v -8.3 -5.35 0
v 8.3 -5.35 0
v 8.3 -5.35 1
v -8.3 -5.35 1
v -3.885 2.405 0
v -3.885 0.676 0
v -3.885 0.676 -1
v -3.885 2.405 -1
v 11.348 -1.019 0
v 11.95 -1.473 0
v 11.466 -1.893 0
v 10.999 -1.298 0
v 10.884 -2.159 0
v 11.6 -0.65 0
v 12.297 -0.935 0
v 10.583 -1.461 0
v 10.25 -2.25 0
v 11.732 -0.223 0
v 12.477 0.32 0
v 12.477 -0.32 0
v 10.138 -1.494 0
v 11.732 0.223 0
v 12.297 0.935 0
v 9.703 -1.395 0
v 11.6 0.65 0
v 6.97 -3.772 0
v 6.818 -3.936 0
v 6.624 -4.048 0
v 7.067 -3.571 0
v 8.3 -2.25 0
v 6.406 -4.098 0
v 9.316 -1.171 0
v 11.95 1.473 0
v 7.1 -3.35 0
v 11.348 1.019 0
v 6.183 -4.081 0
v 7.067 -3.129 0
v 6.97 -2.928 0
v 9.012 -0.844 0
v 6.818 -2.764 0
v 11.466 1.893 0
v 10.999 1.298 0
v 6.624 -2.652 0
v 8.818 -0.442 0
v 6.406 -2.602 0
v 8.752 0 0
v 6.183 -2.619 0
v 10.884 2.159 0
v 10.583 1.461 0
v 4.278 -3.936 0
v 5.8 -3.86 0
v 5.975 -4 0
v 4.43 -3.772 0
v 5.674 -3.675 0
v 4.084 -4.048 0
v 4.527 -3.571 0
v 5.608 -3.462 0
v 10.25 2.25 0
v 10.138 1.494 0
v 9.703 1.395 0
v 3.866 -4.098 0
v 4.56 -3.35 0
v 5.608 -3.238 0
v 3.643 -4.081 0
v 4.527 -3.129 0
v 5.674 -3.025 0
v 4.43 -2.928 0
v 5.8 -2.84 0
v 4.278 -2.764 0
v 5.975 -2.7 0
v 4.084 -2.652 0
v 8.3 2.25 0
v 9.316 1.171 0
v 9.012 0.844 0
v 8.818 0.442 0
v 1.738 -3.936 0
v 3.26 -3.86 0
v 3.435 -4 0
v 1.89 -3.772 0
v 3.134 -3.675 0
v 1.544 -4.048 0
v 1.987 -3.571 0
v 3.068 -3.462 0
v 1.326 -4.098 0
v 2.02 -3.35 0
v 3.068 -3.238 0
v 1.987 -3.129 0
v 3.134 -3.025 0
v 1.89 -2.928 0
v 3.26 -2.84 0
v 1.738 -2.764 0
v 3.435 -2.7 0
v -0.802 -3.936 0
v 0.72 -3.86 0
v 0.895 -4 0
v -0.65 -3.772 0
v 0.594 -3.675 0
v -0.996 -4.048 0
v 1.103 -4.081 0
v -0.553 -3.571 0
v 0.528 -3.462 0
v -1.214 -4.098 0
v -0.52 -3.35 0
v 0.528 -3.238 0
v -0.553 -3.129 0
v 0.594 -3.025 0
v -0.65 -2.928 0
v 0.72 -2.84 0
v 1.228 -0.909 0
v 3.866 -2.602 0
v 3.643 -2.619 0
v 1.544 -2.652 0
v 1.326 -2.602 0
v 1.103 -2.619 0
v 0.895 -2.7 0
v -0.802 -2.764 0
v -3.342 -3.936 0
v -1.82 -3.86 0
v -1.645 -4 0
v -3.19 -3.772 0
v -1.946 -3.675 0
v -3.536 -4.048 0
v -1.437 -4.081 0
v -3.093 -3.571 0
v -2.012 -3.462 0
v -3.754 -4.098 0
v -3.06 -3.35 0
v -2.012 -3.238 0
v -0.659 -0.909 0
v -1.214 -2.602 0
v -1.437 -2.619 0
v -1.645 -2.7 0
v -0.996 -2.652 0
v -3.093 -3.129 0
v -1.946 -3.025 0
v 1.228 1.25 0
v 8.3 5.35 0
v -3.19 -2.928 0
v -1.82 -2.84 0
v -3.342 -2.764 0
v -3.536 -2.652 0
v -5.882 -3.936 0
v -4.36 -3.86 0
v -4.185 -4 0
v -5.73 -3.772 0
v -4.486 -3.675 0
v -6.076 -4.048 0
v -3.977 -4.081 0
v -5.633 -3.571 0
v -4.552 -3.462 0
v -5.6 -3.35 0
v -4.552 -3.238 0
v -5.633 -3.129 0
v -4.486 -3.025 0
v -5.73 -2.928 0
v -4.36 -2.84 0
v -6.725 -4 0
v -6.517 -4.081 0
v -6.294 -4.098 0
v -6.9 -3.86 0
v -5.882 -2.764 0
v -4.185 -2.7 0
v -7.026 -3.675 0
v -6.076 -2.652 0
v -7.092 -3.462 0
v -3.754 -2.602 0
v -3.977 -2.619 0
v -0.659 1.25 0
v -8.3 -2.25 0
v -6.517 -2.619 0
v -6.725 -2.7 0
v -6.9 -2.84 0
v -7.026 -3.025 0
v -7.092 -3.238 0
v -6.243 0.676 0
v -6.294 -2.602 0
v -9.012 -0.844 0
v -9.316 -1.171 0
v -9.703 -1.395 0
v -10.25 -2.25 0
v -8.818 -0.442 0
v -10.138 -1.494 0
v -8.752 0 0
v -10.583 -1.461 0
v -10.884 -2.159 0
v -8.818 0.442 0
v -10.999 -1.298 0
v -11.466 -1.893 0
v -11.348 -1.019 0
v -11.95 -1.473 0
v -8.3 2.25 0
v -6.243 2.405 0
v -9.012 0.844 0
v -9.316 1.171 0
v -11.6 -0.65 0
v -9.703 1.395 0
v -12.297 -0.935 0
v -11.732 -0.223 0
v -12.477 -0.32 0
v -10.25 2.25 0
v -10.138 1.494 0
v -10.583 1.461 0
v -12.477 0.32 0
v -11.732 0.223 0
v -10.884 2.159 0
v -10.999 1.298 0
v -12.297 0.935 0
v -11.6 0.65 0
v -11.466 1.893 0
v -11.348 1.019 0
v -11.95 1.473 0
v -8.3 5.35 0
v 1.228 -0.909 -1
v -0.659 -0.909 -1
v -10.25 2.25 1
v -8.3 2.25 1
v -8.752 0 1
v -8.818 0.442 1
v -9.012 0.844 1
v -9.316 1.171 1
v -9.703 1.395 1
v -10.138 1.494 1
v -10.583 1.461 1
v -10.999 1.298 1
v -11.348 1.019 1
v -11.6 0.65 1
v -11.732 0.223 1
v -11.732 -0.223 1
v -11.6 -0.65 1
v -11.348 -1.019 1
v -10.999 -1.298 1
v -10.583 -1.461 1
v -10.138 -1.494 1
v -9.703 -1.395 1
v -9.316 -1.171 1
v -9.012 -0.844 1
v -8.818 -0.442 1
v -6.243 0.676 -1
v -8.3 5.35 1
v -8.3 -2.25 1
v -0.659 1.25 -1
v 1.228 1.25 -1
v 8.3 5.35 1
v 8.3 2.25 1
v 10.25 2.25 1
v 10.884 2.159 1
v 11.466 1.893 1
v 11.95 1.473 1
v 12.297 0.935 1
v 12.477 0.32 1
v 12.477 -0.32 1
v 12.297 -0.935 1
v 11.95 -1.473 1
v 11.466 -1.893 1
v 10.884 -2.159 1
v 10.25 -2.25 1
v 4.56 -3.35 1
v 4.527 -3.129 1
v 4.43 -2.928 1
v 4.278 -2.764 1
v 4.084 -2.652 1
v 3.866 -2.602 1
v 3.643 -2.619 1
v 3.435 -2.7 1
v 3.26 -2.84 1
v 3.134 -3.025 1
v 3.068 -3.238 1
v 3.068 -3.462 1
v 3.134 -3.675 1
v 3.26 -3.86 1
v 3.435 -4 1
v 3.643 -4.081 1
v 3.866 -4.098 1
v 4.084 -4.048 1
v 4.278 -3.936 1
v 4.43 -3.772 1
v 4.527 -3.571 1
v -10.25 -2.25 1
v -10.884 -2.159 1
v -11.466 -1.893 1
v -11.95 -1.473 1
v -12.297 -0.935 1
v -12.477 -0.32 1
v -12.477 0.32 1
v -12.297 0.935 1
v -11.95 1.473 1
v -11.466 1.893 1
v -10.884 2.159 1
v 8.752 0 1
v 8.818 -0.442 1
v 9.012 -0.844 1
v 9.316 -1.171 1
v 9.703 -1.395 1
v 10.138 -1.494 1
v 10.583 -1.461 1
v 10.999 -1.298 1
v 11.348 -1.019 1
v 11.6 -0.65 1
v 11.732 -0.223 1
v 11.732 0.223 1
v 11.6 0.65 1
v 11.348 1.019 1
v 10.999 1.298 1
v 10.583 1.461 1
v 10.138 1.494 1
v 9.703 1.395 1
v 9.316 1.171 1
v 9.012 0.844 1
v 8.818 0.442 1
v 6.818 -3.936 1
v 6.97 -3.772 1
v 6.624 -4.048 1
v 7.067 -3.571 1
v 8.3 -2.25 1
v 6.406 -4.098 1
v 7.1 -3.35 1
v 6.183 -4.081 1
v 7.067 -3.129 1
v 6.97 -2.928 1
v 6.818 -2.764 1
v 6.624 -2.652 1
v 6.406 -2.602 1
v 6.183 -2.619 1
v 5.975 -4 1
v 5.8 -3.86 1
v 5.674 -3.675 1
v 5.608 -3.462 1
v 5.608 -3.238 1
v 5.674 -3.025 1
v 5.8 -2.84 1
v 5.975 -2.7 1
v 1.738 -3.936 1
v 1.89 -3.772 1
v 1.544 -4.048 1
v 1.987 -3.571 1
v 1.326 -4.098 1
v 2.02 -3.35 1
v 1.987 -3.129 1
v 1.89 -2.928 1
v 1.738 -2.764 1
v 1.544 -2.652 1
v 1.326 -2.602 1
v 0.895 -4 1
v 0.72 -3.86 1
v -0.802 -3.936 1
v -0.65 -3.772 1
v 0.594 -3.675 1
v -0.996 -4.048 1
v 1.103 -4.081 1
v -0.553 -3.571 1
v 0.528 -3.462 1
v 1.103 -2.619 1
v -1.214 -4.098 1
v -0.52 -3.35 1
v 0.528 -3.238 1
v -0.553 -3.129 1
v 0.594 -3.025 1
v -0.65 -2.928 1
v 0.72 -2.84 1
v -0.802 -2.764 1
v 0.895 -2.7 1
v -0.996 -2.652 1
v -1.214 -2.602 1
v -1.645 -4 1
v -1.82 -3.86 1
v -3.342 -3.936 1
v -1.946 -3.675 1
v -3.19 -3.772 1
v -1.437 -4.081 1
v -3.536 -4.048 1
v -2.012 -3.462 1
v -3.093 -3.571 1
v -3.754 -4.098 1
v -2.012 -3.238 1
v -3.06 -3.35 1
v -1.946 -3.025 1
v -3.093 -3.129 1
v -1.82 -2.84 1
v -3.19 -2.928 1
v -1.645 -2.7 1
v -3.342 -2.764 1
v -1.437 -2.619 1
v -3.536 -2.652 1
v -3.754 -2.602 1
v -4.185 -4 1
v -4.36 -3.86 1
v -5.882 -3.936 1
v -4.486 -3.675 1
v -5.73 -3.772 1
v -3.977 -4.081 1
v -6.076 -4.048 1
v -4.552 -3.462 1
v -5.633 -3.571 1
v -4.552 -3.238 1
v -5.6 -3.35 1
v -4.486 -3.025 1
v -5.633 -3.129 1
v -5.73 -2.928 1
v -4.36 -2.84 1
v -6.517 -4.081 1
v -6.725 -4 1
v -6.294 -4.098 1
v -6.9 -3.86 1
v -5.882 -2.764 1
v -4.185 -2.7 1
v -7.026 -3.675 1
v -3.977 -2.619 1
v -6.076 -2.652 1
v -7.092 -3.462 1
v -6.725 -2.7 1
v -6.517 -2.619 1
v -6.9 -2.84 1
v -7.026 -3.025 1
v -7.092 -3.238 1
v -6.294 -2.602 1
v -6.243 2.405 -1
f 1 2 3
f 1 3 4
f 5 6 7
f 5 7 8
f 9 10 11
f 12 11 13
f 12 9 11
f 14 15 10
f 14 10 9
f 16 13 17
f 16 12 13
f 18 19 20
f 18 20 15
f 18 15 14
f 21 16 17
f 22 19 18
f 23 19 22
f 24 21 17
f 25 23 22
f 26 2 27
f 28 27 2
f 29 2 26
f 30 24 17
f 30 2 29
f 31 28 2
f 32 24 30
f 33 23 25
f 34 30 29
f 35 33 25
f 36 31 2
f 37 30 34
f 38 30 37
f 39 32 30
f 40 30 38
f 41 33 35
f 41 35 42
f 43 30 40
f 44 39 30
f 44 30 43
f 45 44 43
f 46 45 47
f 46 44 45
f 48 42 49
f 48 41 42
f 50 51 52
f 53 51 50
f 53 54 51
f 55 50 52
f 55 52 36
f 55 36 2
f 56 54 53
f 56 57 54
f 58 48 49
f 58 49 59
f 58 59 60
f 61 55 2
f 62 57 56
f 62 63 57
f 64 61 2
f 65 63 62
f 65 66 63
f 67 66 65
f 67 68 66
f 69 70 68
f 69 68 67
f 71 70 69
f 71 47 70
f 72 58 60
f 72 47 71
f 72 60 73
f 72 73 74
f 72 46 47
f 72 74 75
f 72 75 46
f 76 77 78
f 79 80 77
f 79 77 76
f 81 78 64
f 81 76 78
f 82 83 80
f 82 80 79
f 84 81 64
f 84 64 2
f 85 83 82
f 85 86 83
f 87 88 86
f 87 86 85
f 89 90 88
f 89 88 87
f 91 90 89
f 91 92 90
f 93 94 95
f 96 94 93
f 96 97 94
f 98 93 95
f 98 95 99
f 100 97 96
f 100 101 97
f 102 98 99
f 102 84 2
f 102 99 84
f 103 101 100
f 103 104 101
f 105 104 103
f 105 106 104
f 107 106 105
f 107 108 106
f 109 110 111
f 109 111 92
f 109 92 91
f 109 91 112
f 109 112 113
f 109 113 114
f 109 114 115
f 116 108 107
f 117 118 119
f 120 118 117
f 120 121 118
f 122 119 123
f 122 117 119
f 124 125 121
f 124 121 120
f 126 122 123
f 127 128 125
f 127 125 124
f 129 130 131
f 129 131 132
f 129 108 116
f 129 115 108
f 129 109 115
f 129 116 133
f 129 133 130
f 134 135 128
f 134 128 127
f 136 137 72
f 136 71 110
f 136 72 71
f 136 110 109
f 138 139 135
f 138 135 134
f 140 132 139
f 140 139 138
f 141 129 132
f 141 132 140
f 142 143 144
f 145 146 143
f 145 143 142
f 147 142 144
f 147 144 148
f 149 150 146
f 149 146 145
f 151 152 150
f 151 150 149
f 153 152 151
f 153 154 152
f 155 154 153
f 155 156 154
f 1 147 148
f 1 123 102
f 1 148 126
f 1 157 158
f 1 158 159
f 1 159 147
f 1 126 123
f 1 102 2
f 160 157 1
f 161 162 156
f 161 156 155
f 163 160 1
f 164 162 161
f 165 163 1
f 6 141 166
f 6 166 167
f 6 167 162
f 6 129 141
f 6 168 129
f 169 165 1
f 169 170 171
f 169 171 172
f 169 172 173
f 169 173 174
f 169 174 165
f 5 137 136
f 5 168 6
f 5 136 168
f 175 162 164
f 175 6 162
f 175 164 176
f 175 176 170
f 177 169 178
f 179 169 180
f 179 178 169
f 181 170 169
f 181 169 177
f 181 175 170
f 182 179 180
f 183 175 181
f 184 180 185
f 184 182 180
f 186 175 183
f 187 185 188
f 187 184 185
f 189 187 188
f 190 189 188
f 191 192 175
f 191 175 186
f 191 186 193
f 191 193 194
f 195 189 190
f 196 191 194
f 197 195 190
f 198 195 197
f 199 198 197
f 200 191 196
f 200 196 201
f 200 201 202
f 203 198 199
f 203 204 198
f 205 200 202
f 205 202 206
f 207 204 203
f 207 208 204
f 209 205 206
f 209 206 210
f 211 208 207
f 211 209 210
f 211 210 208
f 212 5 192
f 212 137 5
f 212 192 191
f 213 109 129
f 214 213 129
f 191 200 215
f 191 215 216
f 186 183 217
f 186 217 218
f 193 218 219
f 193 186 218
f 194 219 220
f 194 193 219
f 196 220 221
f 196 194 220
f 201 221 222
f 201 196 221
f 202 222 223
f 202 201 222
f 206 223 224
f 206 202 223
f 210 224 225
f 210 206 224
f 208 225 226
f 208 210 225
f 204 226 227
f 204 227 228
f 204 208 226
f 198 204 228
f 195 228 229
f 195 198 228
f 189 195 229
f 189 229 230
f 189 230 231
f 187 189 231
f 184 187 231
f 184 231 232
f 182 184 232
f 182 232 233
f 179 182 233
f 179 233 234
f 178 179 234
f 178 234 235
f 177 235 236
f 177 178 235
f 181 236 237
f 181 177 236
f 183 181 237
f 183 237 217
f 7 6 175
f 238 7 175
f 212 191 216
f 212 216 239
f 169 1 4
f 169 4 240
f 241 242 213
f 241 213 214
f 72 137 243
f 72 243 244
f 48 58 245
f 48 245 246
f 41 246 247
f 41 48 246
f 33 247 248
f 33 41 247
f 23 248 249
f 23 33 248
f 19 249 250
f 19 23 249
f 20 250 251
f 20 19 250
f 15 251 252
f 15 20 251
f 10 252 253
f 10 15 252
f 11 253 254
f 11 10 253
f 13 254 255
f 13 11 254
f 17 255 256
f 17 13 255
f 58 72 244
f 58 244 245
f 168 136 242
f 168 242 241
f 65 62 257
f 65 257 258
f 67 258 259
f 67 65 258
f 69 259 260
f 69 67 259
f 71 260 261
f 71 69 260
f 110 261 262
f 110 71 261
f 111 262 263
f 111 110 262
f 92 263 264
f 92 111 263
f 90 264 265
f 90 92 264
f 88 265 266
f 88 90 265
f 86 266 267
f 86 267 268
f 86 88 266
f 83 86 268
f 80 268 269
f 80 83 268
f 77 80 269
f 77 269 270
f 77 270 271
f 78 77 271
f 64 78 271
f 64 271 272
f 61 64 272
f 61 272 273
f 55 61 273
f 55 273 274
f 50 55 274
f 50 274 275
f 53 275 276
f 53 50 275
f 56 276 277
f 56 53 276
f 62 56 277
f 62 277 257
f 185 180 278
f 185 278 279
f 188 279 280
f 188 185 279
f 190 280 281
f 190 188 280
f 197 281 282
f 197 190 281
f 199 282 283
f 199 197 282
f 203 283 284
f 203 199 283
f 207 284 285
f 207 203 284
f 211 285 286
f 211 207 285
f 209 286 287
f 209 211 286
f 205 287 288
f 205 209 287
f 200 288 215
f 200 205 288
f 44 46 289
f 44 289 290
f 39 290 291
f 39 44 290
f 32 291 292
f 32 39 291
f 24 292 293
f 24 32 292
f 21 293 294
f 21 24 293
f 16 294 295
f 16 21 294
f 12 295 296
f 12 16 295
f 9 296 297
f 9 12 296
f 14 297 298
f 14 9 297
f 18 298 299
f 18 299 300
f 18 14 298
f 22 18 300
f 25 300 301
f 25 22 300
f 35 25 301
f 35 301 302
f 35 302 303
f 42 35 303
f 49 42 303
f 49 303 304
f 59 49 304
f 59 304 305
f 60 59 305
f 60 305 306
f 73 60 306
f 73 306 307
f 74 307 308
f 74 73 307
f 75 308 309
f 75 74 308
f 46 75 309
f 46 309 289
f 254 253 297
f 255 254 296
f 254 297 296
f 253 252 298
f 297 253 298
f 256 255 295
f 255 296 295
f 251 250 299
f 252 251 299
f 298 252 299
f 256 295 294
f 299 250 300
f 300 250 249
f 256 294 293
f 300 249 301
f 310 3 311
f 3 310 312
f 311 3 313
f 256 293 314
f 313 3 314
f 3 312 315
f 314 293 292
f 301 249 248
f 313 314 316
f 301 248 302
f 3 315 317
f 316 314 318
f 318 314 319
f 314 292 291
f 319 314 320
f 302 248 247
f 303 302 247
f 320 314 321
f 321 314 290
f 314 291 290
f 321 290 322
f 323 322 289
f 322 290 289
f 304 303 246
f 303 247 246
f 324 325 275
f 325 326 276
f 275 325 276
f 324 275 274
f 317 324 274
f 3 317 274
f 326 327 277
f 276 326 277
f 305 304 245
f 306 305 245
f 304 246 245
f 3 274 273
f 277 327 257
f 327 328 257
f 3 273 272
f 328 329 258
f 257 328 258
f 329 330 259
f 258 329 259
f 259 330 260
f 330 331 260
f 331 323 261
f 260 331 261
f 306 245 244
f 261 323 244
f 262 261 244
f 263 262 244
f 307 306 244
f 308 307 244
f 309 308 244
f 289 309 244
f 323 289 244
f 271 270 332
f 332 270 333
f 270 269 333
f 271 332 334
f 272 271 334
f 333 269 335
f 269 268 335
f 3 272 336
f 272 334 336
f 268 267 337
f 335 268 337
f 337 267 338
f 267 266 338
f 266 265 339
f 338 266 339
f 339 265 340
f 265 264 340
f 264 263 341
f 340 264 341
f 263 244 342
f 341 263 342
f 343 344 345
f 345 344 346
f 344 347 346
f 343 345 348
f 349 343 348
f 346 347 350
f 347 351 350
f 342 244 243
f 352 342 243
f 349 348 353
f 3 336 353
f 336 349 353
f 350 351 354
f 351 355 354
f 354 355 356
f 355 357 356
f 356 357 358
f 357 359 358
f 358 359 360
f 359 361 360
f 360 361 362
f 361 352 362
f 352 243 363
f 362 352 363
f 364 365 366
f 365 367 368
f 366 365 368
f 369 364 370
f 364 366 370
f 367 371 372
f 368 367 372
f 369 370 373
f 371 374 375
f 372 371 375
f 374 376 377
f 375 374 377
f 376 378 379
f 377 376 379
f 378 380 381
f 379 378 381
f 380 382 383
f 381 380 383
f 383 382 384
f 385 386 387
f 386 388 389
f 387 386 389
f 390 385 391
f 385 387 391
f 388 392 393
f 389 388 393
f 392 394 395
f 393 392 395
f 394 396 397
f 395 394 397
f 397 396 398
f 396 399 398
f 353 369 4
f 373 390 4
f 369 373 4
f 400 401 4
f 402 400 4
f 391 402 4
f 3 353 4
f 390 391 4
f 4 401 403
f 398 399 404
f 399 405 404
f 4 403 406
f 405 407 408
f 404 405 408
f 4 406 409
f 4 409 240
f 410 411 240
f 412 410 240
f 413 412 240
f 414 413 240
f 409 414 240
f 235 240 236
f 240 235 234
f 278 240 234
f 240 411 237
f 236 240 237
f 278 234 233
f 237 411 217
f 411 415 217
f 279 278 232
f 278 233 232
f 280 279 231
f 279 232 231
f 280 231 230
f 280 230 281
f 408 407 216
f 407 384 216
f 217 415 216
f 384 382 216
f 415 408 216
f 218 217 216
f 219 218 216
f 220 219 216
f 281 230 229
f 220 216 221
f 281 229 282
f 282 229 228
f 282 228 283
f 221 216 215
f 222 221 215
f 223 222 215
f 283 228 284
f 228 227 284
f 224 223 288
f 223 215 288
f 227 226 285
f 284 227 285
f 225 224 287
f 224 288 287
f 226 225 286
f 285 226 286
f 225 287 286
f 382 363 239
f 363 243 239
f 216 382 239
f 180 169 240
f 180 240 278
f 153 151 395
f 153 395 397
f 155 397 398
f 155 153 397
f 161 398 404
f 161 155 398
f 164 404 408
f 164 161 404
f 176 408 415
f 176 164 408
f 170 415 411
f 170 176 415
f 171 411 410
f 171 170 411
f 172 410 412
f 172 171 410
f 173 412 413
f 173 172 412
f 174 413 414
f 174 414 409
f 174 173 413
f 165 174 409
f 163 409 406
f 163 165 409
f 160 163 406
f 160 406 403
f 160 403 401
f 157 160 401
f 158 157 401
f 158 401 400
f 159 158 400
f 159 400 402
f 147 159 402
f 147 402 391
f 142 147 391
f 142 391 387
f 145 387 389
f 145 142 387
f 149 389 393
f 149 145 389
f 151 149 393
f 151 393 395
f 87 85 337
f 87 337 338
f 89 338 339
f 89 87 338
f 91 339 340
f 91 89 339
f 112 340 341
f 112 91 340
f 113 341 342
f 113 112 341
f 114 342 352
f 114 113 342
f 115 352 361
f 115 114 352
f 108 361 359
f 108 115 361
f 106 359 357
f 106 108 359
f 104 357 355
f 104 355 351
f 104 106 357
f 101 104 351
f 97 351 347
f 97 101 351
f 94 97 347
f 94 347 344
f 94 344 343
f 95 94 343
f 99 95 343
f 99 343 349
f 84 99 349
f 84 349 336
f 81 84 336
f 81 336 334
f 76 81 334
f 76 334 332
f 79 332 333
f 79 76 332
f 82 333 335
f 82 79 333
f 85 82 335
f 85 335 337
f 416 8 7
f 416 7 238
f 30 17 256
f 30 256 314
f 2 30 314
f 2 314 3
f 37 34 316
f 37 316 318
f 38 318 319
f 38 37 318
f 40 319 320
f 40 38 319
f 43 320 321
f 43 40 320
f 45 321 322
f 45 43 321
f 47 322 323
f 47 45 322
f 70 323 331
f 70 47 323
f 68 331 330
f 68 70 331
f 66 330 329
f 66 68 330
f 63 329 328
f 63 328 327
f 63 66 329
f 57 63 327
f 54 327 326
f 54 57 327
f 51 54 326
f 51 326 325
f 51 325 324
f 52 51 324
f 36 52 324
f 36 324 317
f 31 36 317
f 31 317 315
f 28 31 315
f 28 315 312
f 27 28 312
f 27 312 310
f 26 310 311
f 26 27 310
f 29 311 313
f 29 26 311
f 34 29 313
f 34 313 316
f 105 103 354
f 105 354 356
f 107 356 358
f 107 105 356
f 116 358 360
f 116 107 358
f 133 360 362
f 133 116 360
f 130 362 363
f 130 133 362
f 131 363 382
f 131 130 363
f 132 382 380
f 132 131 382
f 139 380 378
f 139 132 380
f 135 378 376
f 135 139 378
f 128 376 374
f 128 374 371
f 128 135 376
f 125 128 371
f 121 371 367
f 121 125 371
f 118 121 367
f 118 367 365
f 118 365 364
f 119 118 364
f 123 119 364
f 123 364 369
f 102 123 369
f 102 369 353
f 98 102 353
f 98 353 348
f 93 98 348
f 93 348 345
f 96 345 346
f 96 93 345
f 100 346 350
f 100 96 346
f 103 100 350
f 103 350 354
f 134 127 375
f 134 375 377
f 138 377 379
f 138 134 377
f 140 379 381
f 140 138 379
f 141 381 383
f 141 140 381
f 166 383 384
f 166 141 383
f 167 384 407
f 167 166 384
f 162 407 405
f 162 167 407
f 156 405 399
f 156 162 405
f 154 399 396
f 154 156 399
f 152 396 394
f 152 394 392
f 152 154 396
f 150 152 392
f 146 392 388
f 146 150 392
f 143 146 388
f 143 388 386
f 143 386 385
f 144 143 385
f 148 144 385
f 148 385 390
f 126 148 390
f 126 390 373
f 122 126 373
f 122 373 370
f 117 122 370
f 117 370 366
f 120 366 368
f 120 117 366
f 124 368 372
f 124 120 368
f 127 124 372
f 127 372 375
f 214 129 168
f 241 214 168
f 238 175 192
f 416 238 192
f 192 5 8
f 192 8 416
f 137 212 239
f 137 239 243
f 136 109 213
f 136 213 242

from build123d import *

# Parameters (mm, degrees)
SKETCH_1_R      = 1.498311188
SKETCH_1_R_2    = 0.75
EXTRUDE_1_DEPTH = 1
SKETCH_3_W      = 1.886758636
SKETCH_3_H      = 2.158643663
SKETCH_3_W_2    = 2.358039665
SKETCH_3_H_2    = 1.729620016
EXTRUDE_2_DEPTH = 1


with BuildPart() as part:
    # 草图1 → 凸台-拉伸1 (new body)
    with BuildSketch(Plane.XY):
        with BuildLine():
            Line((-10.25, 2.25), (-8.3, 2.25))
            Line((-8.3, 2.25), (-8.3, 5.35))
            Line((-8.3, 5.35), (8.3, 5.35))
            Line((8.3, 5.35), (8.3, 2.25))
            Line((8.3, 2.25), (10.25, 2.25))
            ThreePointArc((10.25, 2.25), (12.5, 0), (10.25, -2.25))
            Line((10.25, -2.25), (8.3, -2.25))
            Line((8.3, -2.25), (8.3, -5.35))
            Line((8.3, -5.35), (-8.3, -5.35))
            Line((-8.3, -5.35), (-8.3, -2.25))
            Line((-8.3, -2.25), (-10.25, -2.25))
            ThreePointArc((-10.25, -2.25), (-12.5, 0), (-10.25, 2.25))
        make_face()
        with Locations((-10.25, 0)):
            Circle(SKETCH_1_R, mode=Mode.SUBTRACT)
        with Locations(Location((10.25, 0, 0), (0, 0, 180))):
            Circle(SKETCH_1_R, mode=Mode.SUBTRACT)
        with Locations((-6.35, -3.35)):
            Circle(SKETCH_1_R_2, mode=Mode.SUBTRACT)
        with Locations((-3.81, -3.35)):
            Circle(SKETCH_1_R_2, mode=Mode.SUBTRACT)
        with Locations((-1.27, -3.35)):
            Circle(SKETCH_1_R_2, mode=Mode.SUBTRACT)
        with Locations((1.27, -3.35)):
            Circle(SKETCH_1_R_2, mode=Mode.SUBTRACT)
        with Locations((3.81, -3.35)):
            Circle(SKETCH_1_R_2, mode=Mode.SUBTRACT)
        with Locations((6.35, -3.35)):
            Circle(SKETCH_1_R_2, mode=Mode.SUBTRACT)
    extrude(amount=EXTRUDE_1_DEPTH)

    # 草图3 → 凸台-拉伸2 (add)
    with BuildSketch(Plane(origin=(0, 0, 0), x_dir=(-1, 0, 0), z_dir=(0, 0, -1))):
        with Locations((-0.28460322, 0.170508759)):
            Rectangle(SKETCH_3_W, SKETCH_3_H)
        with Locations((5.064207673, 1.540607703)):
            Rectangle(SKETCH_3_W_2, SKETCH_3_H_2)
    extrude(amount=EXTRUDE_2_DEPTH)


solid = part.part
